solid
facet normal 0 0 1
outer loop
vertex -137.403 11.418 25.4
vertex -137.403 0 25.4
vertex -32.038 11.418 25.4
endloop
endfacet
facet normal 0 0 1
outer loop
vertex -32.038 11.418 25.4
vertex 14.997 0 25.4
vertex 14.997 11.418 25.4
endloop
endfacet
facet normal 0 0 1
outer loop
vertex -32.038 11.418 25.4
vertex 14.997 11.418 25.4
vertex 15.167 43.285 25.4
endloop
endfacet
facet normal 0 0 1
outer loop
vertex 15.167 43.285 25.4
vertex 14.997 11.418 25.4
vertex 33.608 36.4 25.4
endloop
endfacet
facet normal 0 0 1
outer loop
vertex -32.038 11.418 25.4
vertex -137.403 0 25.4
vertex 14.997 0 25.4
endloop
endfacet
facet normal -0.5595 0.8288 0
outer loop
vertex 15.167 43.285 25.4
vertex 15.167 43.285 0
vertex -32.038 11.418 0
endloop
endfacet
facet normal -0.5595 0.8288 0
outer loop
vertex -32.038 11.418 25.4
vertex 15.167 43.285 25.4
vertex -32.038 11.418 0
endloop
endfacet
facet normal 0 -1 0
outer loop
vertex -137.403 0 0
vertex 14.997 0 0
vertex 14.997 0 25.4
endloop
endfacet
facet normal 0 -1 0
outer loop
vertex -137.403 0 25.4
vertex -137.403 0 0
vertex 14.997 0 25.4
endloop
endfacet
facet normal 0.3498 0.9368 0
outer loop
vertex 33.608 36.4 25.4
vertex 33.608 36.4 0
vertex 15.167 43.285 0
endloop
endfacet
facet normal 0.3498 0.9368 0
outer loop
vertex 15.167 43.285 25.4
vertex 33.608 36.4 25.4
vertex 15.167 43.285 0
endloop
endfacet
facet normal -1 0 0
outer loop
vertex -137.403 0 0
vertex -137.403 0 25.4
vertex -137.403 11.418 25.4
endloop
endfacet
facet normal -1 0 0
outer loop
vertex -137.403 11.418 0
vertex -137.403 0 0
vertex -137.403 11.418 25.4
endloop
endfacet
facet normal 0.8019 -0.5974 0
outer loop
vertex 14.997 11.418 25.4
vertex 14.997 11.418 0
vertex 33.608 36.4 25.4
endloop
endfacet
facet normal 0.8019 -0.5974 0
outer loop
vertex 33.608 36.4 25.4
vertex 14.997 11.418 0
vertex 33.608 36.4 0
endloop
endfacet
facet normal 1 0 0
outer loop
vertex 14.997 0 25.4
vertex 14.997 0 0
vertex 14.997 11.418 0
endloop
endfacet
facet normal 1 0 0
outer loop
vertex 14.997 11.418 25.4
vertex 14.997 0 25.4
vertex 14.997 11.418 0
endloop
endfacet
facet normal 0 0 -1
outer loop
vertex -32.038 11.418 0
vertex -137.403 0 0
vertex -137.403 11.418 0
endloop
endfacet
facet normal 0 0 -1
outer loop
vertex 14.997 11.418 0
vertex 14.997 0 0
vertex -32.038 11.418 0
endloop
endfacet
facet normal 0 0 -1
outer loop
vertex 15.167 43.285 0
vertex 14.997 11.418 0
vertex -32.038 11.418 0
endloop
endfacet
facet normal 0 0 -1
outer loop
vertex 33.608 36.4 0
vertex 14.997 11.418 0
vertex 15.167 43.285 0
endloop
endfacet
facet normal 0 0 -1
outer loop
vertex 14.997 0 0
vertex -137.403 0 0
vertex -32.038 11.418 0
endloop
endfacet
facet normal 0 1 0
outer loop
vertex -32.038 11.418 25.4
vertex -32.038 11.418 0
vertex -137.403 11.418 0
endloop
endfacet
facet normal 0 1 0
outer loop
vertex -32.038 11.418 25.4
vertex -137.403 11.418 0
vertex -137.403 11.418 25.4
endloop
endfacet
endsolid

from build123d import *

# Parameters (mm, degrees)
F1_DEPTH  = 25.4
F1_FACE_W = 11.417828
F1_FACE_H = 25.4
F2_DEPTH  = 152.4


with BuildPart() as f1:
    # F0 (on Top) → F1 (new body)
    with BuildSketch(Plane.XY):
        Polygon((-64.757831, 0), (14.996547, 0), (14.996547, 11.417828), (-32.038085, 11.417828), (-64.757831, 11.417828), align=None)
        Polygon((-32.038085, 11.417828), (14.996547, 11.417828), (33.608254, 36.400016), (15.166967, 43.285497), align=None)
    extrude(amount=F1_DEPTH)

    # F1_face (on face) → F2 (join)
    with BuildSketch(Plane(origin=(14.996547, 5.708914, 12.7), x_dir=(0, 1, 0), z_dir=(1, 0, 0))):
        Rectangle(F1_FACE_W, F1_FACE_H)
    extrude(amount=-F2_DEPTH)


solid = f1.part
